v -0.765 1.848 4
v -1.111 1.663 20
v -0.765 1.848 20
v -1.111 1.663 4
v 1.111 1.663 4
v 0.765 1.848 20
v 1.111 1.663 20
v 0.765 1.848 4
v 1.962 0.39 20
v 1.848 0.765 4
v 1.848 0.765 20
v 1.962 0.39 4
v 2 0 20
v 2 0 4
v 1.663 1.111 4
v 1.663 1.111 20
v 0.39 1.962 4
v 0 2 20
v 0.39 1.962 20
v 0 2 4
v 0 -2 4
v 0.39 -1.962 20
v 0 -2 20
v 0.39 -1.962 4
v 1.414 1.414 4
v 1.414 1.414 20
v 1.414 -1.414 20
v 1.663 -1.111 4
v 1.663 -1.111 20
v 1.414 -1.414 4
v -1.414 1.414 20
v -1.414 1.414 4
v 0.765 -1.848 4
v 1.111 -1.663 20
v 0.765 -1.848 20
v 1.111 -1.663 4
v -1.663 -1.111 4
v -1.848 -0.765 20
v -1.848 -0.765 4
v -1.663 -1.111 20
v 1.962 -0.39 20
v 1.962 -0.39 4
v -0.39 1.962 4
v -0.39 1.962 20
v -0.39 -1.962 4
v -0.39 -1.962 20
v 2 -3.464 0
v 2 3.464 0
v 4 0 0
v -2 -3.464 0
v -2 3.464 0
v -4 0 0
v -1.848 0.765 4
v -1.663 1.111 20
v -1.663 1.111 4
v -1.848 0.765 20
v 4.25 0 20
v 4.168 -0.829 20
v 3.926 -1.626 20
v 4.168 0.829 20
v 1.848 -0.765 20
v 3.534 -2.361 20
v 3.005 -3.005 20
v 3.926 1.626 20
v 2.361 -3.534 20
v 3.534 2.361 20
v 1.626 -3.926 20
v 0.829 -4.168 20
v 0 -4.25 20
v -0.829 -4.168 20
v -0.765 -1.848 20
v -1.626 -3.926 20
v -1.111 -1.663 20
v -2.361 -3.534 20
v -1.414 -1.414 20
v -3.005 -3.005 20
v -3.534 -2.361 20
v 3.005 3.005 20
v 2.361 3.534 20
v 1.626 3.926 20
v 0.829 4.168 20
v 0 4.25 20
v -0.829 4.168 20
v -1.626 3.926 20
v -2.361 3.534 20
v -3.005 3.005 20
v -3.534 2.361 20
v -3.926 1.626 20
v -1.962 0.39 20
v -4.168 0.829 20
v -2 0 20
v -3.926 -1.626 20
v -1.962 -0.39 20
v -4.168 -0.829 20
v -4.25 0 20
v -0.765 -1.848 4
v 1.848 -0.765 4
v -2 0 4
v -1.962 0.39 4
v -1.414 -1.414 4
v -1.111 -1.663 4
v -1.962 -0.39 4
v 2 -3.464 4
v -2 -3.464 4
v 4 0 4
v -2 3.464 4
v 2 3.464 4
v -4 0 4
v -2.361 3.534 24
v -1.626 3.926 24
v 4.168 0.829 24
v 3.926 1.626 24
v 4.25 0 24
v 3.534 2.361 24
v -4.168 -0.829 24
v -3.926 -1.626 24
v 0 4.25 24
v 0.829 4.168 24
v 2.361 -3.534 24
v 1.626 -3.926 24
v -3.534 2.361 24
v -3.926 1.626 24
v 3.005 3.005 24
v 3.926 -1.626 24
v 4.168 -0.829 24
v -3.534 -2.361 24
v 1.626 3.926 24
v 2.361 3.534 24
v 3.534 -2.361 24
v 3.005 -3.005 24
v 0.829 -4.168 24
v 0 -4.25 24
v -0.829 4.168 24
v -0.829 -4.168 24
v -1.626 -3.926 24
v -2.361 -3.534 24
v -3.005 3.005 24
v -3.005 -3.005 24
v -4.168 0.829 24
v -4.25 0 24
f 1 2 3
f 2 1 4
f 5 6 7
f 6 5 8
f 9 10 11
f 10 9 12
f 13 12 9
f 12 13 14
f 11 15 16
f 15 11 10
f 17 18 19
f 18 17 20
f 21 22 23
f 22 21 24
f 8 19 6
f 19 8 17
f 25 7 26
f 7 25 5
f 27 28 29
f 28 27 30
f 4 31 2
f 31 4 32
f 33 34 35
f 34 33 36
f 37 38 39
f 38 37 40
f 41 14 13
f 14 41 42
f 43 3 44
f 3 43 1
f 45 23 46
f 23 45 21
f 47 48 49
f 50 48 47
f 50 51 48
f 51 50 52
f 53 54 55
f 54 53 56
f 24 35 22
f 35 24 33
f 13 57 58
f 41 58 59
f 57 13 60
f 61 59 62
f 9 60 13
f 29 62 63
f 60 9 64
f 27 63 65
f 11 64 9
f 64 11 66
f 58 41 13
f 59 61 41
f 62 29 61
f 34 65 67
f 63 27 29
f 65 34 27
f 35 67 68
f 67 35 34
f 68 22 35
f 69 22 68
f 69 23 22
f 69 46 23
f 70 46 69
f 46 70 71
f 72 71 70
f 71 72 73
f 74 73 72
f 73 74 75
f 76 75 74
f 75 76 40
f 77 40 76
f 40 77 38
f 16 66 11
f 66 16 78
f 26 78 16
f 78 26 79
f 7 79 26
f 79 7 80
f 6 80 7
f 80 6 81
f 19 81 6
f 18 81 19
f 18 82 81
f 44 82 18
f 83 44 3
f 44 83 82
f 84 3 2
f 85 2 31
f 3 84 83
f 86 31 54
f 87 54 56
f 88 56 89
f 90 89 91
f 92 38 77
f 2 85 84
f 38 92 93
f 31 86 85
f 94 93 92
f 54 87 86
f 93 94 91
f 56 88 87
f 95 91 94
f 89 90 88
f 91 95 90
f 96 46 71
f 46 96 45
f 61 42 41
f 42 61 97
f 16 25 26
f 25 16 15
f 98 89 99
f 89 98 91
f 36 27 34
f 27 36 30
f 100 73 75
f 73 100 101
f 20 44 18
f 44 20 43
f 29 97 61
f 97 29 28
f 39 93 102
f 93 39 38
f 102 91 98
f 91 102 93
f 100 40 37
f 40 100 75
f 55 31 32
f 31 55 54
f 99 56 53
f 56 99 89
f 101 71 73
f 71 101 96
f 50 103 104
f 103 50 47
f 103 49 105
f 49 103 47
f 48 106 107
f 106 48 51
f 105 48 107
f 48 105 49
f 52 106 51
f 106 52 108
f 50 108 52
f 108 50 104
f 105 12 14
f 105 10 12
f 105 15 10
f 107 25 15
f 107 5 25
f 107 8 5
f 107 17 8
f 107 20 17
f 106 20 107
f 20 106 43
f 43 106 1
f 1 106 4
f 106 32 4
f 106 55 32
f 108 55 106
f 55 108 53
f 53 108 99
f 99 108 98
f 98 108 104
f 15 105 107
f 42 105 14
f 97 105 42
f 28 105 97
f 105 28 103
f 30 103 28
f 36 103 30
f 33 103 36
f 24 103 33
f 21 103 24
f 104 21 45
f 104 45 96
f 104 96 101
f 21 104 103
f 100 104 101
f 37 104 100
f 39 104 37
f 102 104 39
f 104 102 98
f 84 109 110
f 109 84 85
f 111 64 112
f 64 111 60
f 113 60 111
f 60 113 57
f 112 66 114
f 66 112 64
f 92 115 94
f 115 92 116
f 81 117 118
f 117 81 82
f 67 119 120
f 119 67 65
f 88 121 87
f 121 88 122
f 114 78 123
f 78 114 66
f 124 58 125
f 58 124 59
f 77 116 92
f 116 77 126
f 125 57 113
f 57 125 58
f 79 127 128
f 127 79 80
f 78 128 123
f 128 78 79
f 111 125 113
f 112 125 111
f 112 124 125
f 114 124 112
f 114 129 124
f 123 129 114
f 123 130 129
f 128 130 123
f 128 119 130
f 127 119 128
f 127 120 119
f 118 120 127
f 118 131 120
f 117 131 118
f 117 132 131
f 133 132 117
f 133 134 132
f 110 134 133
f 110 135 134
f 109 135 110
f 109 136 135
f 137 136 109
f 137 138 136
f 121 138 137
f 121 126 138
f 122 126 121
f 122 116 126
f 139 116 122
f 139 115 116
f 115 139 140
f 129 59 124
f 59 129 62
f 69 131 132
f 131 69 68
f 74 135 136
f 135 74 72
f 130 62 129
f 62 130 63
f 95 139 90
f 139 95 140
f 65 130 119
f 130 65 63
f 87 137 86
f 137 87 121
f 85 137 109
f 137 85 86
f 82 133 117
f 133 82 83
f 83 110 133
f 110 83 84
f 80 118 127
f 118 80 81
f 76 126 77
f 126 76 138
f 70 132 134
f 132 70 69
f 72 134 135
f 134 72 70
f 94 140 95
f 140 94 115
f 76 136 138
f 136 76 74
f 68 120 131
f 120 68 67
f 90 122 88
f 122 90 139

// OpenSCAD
/**
 * Martin Egli
 * 2021-11-03
 * M5 screw cut outs
 */

module m5ScrewCut(len = 10, loc_res = 32) {
    translate([0, 0, 0])
    cylinder(d = 5.1, h = len, $fn = loc_res);
}
/*
module m5SinkHeadCut(len = 4, loc_res = 32) {
    translate([0, 0, 0])
    cylinder(d1 = 3.2, d2 = 6.6, h = 2, $fn = loc_res);
    translate([0, 0, 2])
    cylinder(d = 6.6, h = len, $fn = loc_res);
}*/
module m5CylinderHeadCut(len = 4, loc_res = 32) {
    translate([0, 0, 0])
    cylinder(d = 9.7, h = len, $fn = loc_res);
}

module m5WasherCut(washer_dia = 12.2, len = 4, loc_res = 32) {
    translate([0, 0, 0])
    cylinder(d = washer_dia, h = len, $fn = loc_res);
}

module m5NutCut() {
    translate([0, 0, 0])
    cylinder(d = 9, h = 4+4, $fn = 6);
}
/*
module m5SinkHeadScewNutCut(len = 10, loc_res = 32) {
    translate([0, 0, len])
    m3SinkHeadCut(4, loc_res);
    m3ScrewCut(len+1, loc_res);
    m3NutCut();
}
*/
module m5CylinderHeadScewNutCut(len = 10, loc_res = 32) {
    translate([0, 0, len])
    m5CylinderHeadCut(6, loc_res);
    m5ScrewCut(len+1, loc_res);
    m5NutCut();
}

module m5CylinderHeadWasherScewNutCut(len = 10, washer_dia = 12.2, loc_res = 32) {
    translate([0, 0, len])
    m5WasherCut(washer_dia, 30, loc_res);
    m5ScrewCut(len+1, loc_res);
    m5NutCut();
}

module m5TestingCylinderScrew(col = "Red", len = 20, loc_res = 32) {
    color(col) {
        translate([0, 0, 0])
        cylinder(d = 5-1, h = len, $fn = loc_res);
        translate([0, 0, 0])
        cylinder(d = 9-1, h = 4, $fn = 6);
        translate([0, 0, len])
        cylinder(d = 9.5-1, h = 4, $fn = loc_res);
    }
}

//m5SinkHeadScewNutCut(20);
//m5CylinderHeadScewNutCut(15);
//m5CylinderHeadWasherScewNutCut(20);
m5TestingCylinderScrew();
